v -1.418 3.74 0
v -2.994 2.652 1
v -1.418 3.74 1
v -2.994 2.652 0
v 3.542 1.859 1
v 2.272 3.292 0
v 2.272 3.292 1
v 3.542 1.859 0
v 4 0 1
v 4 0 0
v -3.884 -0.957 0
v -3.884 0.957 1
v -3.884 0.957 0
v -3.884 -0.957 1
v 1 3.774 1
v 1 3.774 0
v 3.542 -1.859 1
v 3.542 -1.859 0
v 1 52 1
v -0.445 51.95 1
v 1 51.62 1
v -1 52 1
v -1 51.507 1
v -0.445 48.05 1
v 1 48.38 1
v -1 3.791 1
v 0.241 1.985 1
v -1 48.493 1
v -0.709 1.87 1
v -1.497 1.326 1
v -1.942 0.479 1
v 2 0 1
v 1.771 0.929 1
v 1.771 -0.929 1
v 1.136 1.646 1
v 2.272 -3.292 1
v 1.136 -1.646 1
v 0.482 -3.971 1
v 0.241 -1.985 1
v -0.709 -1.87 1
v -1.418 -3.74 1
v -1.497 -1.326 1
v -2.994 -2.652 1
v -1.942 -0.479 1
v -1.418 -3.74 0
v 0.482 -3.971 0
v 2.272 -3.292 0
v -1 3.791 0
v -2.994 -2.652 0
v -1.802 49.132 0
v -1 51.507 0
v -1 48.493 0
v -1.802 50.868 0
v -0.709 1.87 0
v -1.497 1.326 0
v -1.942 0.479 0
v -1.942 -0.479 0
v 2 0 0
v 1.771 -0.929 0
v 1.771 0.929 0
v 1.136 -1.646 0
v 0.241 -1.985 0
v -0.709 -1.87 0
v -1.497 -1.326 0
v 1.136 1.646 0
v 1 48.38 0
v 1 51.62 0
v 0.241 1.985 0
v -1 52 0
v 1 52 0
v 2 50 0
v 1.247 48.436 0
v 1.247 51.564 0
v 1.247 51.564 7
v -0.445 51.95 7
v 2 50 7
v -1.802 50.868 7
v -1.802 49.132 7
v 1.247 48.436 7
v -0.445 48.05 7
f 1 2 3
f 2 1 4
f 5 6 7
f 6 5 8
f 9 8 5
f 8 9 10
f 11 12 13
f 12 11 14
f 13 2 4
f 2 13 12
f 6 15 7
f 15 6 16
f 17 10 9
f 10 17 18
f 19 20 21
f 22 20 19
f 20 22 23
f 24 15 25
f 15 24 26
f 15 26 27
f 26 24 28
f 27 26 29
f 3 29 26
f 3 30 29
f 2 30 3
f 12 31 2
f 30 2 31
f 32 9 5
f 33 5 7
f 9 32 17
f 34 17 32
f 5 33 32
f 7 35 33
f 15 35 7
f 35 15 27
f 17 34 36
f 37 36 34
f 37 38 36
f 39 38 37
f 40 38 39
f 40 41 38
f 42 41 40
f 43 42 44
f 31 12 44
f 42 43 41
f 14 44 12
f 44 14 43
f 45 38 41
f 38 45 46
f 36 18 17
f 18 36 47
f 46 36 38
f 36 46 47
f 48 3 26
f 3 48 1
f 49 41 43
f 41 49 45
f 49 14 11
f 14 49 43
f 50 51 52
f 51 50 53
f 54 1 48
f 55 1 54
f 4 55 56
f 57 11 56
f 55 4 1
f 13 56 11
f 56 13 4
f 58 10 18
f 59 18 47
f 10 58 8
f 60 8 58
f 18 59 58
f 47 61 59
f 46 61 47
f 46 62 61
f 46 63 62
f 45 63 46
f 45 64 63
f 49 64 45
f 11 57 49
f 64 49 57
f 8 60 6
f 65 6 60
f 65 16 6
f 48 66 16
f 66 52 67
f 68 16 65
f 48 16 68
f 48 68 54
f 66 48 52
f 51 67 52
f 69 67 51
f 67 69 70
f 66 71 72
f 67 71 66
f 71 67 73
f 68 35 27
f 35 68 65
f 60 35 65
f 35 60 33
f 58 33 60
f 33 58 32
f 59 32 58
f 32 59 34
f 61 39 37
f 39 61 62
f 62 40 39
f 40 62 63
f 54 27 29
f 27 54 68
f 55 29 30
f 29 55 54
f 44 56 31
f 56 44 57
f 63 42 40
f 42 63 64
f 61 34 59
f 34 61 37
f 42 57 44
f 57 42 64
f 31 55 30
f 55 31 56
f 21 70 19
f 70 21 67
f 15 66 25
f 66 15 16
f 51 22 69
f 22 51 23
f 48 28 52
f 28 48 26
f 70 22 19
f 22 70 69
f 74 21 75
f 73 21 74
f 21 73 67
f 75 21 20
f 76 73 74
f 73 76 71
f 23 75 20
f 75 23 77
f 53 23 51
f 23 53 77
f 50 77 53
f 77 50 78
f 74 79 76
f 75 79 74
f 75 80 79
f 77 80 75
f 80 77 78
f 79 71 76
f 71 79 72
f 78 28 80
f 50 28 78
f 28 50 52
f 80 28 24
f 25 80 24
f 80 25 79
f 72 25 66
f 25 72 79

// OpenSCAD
use <MCAD/regular_shapes.scad>

t = 1;
r = 2;
flat_t = 2;
l = 50;
h = 7;

cylinder_tube(t, r+flat_t, flat_t);
translate([0, l/2 + r, t/2])
cube([flat_t, l, t], center=true);

translate([0, l, 0])
cylinder(h, r, r);
